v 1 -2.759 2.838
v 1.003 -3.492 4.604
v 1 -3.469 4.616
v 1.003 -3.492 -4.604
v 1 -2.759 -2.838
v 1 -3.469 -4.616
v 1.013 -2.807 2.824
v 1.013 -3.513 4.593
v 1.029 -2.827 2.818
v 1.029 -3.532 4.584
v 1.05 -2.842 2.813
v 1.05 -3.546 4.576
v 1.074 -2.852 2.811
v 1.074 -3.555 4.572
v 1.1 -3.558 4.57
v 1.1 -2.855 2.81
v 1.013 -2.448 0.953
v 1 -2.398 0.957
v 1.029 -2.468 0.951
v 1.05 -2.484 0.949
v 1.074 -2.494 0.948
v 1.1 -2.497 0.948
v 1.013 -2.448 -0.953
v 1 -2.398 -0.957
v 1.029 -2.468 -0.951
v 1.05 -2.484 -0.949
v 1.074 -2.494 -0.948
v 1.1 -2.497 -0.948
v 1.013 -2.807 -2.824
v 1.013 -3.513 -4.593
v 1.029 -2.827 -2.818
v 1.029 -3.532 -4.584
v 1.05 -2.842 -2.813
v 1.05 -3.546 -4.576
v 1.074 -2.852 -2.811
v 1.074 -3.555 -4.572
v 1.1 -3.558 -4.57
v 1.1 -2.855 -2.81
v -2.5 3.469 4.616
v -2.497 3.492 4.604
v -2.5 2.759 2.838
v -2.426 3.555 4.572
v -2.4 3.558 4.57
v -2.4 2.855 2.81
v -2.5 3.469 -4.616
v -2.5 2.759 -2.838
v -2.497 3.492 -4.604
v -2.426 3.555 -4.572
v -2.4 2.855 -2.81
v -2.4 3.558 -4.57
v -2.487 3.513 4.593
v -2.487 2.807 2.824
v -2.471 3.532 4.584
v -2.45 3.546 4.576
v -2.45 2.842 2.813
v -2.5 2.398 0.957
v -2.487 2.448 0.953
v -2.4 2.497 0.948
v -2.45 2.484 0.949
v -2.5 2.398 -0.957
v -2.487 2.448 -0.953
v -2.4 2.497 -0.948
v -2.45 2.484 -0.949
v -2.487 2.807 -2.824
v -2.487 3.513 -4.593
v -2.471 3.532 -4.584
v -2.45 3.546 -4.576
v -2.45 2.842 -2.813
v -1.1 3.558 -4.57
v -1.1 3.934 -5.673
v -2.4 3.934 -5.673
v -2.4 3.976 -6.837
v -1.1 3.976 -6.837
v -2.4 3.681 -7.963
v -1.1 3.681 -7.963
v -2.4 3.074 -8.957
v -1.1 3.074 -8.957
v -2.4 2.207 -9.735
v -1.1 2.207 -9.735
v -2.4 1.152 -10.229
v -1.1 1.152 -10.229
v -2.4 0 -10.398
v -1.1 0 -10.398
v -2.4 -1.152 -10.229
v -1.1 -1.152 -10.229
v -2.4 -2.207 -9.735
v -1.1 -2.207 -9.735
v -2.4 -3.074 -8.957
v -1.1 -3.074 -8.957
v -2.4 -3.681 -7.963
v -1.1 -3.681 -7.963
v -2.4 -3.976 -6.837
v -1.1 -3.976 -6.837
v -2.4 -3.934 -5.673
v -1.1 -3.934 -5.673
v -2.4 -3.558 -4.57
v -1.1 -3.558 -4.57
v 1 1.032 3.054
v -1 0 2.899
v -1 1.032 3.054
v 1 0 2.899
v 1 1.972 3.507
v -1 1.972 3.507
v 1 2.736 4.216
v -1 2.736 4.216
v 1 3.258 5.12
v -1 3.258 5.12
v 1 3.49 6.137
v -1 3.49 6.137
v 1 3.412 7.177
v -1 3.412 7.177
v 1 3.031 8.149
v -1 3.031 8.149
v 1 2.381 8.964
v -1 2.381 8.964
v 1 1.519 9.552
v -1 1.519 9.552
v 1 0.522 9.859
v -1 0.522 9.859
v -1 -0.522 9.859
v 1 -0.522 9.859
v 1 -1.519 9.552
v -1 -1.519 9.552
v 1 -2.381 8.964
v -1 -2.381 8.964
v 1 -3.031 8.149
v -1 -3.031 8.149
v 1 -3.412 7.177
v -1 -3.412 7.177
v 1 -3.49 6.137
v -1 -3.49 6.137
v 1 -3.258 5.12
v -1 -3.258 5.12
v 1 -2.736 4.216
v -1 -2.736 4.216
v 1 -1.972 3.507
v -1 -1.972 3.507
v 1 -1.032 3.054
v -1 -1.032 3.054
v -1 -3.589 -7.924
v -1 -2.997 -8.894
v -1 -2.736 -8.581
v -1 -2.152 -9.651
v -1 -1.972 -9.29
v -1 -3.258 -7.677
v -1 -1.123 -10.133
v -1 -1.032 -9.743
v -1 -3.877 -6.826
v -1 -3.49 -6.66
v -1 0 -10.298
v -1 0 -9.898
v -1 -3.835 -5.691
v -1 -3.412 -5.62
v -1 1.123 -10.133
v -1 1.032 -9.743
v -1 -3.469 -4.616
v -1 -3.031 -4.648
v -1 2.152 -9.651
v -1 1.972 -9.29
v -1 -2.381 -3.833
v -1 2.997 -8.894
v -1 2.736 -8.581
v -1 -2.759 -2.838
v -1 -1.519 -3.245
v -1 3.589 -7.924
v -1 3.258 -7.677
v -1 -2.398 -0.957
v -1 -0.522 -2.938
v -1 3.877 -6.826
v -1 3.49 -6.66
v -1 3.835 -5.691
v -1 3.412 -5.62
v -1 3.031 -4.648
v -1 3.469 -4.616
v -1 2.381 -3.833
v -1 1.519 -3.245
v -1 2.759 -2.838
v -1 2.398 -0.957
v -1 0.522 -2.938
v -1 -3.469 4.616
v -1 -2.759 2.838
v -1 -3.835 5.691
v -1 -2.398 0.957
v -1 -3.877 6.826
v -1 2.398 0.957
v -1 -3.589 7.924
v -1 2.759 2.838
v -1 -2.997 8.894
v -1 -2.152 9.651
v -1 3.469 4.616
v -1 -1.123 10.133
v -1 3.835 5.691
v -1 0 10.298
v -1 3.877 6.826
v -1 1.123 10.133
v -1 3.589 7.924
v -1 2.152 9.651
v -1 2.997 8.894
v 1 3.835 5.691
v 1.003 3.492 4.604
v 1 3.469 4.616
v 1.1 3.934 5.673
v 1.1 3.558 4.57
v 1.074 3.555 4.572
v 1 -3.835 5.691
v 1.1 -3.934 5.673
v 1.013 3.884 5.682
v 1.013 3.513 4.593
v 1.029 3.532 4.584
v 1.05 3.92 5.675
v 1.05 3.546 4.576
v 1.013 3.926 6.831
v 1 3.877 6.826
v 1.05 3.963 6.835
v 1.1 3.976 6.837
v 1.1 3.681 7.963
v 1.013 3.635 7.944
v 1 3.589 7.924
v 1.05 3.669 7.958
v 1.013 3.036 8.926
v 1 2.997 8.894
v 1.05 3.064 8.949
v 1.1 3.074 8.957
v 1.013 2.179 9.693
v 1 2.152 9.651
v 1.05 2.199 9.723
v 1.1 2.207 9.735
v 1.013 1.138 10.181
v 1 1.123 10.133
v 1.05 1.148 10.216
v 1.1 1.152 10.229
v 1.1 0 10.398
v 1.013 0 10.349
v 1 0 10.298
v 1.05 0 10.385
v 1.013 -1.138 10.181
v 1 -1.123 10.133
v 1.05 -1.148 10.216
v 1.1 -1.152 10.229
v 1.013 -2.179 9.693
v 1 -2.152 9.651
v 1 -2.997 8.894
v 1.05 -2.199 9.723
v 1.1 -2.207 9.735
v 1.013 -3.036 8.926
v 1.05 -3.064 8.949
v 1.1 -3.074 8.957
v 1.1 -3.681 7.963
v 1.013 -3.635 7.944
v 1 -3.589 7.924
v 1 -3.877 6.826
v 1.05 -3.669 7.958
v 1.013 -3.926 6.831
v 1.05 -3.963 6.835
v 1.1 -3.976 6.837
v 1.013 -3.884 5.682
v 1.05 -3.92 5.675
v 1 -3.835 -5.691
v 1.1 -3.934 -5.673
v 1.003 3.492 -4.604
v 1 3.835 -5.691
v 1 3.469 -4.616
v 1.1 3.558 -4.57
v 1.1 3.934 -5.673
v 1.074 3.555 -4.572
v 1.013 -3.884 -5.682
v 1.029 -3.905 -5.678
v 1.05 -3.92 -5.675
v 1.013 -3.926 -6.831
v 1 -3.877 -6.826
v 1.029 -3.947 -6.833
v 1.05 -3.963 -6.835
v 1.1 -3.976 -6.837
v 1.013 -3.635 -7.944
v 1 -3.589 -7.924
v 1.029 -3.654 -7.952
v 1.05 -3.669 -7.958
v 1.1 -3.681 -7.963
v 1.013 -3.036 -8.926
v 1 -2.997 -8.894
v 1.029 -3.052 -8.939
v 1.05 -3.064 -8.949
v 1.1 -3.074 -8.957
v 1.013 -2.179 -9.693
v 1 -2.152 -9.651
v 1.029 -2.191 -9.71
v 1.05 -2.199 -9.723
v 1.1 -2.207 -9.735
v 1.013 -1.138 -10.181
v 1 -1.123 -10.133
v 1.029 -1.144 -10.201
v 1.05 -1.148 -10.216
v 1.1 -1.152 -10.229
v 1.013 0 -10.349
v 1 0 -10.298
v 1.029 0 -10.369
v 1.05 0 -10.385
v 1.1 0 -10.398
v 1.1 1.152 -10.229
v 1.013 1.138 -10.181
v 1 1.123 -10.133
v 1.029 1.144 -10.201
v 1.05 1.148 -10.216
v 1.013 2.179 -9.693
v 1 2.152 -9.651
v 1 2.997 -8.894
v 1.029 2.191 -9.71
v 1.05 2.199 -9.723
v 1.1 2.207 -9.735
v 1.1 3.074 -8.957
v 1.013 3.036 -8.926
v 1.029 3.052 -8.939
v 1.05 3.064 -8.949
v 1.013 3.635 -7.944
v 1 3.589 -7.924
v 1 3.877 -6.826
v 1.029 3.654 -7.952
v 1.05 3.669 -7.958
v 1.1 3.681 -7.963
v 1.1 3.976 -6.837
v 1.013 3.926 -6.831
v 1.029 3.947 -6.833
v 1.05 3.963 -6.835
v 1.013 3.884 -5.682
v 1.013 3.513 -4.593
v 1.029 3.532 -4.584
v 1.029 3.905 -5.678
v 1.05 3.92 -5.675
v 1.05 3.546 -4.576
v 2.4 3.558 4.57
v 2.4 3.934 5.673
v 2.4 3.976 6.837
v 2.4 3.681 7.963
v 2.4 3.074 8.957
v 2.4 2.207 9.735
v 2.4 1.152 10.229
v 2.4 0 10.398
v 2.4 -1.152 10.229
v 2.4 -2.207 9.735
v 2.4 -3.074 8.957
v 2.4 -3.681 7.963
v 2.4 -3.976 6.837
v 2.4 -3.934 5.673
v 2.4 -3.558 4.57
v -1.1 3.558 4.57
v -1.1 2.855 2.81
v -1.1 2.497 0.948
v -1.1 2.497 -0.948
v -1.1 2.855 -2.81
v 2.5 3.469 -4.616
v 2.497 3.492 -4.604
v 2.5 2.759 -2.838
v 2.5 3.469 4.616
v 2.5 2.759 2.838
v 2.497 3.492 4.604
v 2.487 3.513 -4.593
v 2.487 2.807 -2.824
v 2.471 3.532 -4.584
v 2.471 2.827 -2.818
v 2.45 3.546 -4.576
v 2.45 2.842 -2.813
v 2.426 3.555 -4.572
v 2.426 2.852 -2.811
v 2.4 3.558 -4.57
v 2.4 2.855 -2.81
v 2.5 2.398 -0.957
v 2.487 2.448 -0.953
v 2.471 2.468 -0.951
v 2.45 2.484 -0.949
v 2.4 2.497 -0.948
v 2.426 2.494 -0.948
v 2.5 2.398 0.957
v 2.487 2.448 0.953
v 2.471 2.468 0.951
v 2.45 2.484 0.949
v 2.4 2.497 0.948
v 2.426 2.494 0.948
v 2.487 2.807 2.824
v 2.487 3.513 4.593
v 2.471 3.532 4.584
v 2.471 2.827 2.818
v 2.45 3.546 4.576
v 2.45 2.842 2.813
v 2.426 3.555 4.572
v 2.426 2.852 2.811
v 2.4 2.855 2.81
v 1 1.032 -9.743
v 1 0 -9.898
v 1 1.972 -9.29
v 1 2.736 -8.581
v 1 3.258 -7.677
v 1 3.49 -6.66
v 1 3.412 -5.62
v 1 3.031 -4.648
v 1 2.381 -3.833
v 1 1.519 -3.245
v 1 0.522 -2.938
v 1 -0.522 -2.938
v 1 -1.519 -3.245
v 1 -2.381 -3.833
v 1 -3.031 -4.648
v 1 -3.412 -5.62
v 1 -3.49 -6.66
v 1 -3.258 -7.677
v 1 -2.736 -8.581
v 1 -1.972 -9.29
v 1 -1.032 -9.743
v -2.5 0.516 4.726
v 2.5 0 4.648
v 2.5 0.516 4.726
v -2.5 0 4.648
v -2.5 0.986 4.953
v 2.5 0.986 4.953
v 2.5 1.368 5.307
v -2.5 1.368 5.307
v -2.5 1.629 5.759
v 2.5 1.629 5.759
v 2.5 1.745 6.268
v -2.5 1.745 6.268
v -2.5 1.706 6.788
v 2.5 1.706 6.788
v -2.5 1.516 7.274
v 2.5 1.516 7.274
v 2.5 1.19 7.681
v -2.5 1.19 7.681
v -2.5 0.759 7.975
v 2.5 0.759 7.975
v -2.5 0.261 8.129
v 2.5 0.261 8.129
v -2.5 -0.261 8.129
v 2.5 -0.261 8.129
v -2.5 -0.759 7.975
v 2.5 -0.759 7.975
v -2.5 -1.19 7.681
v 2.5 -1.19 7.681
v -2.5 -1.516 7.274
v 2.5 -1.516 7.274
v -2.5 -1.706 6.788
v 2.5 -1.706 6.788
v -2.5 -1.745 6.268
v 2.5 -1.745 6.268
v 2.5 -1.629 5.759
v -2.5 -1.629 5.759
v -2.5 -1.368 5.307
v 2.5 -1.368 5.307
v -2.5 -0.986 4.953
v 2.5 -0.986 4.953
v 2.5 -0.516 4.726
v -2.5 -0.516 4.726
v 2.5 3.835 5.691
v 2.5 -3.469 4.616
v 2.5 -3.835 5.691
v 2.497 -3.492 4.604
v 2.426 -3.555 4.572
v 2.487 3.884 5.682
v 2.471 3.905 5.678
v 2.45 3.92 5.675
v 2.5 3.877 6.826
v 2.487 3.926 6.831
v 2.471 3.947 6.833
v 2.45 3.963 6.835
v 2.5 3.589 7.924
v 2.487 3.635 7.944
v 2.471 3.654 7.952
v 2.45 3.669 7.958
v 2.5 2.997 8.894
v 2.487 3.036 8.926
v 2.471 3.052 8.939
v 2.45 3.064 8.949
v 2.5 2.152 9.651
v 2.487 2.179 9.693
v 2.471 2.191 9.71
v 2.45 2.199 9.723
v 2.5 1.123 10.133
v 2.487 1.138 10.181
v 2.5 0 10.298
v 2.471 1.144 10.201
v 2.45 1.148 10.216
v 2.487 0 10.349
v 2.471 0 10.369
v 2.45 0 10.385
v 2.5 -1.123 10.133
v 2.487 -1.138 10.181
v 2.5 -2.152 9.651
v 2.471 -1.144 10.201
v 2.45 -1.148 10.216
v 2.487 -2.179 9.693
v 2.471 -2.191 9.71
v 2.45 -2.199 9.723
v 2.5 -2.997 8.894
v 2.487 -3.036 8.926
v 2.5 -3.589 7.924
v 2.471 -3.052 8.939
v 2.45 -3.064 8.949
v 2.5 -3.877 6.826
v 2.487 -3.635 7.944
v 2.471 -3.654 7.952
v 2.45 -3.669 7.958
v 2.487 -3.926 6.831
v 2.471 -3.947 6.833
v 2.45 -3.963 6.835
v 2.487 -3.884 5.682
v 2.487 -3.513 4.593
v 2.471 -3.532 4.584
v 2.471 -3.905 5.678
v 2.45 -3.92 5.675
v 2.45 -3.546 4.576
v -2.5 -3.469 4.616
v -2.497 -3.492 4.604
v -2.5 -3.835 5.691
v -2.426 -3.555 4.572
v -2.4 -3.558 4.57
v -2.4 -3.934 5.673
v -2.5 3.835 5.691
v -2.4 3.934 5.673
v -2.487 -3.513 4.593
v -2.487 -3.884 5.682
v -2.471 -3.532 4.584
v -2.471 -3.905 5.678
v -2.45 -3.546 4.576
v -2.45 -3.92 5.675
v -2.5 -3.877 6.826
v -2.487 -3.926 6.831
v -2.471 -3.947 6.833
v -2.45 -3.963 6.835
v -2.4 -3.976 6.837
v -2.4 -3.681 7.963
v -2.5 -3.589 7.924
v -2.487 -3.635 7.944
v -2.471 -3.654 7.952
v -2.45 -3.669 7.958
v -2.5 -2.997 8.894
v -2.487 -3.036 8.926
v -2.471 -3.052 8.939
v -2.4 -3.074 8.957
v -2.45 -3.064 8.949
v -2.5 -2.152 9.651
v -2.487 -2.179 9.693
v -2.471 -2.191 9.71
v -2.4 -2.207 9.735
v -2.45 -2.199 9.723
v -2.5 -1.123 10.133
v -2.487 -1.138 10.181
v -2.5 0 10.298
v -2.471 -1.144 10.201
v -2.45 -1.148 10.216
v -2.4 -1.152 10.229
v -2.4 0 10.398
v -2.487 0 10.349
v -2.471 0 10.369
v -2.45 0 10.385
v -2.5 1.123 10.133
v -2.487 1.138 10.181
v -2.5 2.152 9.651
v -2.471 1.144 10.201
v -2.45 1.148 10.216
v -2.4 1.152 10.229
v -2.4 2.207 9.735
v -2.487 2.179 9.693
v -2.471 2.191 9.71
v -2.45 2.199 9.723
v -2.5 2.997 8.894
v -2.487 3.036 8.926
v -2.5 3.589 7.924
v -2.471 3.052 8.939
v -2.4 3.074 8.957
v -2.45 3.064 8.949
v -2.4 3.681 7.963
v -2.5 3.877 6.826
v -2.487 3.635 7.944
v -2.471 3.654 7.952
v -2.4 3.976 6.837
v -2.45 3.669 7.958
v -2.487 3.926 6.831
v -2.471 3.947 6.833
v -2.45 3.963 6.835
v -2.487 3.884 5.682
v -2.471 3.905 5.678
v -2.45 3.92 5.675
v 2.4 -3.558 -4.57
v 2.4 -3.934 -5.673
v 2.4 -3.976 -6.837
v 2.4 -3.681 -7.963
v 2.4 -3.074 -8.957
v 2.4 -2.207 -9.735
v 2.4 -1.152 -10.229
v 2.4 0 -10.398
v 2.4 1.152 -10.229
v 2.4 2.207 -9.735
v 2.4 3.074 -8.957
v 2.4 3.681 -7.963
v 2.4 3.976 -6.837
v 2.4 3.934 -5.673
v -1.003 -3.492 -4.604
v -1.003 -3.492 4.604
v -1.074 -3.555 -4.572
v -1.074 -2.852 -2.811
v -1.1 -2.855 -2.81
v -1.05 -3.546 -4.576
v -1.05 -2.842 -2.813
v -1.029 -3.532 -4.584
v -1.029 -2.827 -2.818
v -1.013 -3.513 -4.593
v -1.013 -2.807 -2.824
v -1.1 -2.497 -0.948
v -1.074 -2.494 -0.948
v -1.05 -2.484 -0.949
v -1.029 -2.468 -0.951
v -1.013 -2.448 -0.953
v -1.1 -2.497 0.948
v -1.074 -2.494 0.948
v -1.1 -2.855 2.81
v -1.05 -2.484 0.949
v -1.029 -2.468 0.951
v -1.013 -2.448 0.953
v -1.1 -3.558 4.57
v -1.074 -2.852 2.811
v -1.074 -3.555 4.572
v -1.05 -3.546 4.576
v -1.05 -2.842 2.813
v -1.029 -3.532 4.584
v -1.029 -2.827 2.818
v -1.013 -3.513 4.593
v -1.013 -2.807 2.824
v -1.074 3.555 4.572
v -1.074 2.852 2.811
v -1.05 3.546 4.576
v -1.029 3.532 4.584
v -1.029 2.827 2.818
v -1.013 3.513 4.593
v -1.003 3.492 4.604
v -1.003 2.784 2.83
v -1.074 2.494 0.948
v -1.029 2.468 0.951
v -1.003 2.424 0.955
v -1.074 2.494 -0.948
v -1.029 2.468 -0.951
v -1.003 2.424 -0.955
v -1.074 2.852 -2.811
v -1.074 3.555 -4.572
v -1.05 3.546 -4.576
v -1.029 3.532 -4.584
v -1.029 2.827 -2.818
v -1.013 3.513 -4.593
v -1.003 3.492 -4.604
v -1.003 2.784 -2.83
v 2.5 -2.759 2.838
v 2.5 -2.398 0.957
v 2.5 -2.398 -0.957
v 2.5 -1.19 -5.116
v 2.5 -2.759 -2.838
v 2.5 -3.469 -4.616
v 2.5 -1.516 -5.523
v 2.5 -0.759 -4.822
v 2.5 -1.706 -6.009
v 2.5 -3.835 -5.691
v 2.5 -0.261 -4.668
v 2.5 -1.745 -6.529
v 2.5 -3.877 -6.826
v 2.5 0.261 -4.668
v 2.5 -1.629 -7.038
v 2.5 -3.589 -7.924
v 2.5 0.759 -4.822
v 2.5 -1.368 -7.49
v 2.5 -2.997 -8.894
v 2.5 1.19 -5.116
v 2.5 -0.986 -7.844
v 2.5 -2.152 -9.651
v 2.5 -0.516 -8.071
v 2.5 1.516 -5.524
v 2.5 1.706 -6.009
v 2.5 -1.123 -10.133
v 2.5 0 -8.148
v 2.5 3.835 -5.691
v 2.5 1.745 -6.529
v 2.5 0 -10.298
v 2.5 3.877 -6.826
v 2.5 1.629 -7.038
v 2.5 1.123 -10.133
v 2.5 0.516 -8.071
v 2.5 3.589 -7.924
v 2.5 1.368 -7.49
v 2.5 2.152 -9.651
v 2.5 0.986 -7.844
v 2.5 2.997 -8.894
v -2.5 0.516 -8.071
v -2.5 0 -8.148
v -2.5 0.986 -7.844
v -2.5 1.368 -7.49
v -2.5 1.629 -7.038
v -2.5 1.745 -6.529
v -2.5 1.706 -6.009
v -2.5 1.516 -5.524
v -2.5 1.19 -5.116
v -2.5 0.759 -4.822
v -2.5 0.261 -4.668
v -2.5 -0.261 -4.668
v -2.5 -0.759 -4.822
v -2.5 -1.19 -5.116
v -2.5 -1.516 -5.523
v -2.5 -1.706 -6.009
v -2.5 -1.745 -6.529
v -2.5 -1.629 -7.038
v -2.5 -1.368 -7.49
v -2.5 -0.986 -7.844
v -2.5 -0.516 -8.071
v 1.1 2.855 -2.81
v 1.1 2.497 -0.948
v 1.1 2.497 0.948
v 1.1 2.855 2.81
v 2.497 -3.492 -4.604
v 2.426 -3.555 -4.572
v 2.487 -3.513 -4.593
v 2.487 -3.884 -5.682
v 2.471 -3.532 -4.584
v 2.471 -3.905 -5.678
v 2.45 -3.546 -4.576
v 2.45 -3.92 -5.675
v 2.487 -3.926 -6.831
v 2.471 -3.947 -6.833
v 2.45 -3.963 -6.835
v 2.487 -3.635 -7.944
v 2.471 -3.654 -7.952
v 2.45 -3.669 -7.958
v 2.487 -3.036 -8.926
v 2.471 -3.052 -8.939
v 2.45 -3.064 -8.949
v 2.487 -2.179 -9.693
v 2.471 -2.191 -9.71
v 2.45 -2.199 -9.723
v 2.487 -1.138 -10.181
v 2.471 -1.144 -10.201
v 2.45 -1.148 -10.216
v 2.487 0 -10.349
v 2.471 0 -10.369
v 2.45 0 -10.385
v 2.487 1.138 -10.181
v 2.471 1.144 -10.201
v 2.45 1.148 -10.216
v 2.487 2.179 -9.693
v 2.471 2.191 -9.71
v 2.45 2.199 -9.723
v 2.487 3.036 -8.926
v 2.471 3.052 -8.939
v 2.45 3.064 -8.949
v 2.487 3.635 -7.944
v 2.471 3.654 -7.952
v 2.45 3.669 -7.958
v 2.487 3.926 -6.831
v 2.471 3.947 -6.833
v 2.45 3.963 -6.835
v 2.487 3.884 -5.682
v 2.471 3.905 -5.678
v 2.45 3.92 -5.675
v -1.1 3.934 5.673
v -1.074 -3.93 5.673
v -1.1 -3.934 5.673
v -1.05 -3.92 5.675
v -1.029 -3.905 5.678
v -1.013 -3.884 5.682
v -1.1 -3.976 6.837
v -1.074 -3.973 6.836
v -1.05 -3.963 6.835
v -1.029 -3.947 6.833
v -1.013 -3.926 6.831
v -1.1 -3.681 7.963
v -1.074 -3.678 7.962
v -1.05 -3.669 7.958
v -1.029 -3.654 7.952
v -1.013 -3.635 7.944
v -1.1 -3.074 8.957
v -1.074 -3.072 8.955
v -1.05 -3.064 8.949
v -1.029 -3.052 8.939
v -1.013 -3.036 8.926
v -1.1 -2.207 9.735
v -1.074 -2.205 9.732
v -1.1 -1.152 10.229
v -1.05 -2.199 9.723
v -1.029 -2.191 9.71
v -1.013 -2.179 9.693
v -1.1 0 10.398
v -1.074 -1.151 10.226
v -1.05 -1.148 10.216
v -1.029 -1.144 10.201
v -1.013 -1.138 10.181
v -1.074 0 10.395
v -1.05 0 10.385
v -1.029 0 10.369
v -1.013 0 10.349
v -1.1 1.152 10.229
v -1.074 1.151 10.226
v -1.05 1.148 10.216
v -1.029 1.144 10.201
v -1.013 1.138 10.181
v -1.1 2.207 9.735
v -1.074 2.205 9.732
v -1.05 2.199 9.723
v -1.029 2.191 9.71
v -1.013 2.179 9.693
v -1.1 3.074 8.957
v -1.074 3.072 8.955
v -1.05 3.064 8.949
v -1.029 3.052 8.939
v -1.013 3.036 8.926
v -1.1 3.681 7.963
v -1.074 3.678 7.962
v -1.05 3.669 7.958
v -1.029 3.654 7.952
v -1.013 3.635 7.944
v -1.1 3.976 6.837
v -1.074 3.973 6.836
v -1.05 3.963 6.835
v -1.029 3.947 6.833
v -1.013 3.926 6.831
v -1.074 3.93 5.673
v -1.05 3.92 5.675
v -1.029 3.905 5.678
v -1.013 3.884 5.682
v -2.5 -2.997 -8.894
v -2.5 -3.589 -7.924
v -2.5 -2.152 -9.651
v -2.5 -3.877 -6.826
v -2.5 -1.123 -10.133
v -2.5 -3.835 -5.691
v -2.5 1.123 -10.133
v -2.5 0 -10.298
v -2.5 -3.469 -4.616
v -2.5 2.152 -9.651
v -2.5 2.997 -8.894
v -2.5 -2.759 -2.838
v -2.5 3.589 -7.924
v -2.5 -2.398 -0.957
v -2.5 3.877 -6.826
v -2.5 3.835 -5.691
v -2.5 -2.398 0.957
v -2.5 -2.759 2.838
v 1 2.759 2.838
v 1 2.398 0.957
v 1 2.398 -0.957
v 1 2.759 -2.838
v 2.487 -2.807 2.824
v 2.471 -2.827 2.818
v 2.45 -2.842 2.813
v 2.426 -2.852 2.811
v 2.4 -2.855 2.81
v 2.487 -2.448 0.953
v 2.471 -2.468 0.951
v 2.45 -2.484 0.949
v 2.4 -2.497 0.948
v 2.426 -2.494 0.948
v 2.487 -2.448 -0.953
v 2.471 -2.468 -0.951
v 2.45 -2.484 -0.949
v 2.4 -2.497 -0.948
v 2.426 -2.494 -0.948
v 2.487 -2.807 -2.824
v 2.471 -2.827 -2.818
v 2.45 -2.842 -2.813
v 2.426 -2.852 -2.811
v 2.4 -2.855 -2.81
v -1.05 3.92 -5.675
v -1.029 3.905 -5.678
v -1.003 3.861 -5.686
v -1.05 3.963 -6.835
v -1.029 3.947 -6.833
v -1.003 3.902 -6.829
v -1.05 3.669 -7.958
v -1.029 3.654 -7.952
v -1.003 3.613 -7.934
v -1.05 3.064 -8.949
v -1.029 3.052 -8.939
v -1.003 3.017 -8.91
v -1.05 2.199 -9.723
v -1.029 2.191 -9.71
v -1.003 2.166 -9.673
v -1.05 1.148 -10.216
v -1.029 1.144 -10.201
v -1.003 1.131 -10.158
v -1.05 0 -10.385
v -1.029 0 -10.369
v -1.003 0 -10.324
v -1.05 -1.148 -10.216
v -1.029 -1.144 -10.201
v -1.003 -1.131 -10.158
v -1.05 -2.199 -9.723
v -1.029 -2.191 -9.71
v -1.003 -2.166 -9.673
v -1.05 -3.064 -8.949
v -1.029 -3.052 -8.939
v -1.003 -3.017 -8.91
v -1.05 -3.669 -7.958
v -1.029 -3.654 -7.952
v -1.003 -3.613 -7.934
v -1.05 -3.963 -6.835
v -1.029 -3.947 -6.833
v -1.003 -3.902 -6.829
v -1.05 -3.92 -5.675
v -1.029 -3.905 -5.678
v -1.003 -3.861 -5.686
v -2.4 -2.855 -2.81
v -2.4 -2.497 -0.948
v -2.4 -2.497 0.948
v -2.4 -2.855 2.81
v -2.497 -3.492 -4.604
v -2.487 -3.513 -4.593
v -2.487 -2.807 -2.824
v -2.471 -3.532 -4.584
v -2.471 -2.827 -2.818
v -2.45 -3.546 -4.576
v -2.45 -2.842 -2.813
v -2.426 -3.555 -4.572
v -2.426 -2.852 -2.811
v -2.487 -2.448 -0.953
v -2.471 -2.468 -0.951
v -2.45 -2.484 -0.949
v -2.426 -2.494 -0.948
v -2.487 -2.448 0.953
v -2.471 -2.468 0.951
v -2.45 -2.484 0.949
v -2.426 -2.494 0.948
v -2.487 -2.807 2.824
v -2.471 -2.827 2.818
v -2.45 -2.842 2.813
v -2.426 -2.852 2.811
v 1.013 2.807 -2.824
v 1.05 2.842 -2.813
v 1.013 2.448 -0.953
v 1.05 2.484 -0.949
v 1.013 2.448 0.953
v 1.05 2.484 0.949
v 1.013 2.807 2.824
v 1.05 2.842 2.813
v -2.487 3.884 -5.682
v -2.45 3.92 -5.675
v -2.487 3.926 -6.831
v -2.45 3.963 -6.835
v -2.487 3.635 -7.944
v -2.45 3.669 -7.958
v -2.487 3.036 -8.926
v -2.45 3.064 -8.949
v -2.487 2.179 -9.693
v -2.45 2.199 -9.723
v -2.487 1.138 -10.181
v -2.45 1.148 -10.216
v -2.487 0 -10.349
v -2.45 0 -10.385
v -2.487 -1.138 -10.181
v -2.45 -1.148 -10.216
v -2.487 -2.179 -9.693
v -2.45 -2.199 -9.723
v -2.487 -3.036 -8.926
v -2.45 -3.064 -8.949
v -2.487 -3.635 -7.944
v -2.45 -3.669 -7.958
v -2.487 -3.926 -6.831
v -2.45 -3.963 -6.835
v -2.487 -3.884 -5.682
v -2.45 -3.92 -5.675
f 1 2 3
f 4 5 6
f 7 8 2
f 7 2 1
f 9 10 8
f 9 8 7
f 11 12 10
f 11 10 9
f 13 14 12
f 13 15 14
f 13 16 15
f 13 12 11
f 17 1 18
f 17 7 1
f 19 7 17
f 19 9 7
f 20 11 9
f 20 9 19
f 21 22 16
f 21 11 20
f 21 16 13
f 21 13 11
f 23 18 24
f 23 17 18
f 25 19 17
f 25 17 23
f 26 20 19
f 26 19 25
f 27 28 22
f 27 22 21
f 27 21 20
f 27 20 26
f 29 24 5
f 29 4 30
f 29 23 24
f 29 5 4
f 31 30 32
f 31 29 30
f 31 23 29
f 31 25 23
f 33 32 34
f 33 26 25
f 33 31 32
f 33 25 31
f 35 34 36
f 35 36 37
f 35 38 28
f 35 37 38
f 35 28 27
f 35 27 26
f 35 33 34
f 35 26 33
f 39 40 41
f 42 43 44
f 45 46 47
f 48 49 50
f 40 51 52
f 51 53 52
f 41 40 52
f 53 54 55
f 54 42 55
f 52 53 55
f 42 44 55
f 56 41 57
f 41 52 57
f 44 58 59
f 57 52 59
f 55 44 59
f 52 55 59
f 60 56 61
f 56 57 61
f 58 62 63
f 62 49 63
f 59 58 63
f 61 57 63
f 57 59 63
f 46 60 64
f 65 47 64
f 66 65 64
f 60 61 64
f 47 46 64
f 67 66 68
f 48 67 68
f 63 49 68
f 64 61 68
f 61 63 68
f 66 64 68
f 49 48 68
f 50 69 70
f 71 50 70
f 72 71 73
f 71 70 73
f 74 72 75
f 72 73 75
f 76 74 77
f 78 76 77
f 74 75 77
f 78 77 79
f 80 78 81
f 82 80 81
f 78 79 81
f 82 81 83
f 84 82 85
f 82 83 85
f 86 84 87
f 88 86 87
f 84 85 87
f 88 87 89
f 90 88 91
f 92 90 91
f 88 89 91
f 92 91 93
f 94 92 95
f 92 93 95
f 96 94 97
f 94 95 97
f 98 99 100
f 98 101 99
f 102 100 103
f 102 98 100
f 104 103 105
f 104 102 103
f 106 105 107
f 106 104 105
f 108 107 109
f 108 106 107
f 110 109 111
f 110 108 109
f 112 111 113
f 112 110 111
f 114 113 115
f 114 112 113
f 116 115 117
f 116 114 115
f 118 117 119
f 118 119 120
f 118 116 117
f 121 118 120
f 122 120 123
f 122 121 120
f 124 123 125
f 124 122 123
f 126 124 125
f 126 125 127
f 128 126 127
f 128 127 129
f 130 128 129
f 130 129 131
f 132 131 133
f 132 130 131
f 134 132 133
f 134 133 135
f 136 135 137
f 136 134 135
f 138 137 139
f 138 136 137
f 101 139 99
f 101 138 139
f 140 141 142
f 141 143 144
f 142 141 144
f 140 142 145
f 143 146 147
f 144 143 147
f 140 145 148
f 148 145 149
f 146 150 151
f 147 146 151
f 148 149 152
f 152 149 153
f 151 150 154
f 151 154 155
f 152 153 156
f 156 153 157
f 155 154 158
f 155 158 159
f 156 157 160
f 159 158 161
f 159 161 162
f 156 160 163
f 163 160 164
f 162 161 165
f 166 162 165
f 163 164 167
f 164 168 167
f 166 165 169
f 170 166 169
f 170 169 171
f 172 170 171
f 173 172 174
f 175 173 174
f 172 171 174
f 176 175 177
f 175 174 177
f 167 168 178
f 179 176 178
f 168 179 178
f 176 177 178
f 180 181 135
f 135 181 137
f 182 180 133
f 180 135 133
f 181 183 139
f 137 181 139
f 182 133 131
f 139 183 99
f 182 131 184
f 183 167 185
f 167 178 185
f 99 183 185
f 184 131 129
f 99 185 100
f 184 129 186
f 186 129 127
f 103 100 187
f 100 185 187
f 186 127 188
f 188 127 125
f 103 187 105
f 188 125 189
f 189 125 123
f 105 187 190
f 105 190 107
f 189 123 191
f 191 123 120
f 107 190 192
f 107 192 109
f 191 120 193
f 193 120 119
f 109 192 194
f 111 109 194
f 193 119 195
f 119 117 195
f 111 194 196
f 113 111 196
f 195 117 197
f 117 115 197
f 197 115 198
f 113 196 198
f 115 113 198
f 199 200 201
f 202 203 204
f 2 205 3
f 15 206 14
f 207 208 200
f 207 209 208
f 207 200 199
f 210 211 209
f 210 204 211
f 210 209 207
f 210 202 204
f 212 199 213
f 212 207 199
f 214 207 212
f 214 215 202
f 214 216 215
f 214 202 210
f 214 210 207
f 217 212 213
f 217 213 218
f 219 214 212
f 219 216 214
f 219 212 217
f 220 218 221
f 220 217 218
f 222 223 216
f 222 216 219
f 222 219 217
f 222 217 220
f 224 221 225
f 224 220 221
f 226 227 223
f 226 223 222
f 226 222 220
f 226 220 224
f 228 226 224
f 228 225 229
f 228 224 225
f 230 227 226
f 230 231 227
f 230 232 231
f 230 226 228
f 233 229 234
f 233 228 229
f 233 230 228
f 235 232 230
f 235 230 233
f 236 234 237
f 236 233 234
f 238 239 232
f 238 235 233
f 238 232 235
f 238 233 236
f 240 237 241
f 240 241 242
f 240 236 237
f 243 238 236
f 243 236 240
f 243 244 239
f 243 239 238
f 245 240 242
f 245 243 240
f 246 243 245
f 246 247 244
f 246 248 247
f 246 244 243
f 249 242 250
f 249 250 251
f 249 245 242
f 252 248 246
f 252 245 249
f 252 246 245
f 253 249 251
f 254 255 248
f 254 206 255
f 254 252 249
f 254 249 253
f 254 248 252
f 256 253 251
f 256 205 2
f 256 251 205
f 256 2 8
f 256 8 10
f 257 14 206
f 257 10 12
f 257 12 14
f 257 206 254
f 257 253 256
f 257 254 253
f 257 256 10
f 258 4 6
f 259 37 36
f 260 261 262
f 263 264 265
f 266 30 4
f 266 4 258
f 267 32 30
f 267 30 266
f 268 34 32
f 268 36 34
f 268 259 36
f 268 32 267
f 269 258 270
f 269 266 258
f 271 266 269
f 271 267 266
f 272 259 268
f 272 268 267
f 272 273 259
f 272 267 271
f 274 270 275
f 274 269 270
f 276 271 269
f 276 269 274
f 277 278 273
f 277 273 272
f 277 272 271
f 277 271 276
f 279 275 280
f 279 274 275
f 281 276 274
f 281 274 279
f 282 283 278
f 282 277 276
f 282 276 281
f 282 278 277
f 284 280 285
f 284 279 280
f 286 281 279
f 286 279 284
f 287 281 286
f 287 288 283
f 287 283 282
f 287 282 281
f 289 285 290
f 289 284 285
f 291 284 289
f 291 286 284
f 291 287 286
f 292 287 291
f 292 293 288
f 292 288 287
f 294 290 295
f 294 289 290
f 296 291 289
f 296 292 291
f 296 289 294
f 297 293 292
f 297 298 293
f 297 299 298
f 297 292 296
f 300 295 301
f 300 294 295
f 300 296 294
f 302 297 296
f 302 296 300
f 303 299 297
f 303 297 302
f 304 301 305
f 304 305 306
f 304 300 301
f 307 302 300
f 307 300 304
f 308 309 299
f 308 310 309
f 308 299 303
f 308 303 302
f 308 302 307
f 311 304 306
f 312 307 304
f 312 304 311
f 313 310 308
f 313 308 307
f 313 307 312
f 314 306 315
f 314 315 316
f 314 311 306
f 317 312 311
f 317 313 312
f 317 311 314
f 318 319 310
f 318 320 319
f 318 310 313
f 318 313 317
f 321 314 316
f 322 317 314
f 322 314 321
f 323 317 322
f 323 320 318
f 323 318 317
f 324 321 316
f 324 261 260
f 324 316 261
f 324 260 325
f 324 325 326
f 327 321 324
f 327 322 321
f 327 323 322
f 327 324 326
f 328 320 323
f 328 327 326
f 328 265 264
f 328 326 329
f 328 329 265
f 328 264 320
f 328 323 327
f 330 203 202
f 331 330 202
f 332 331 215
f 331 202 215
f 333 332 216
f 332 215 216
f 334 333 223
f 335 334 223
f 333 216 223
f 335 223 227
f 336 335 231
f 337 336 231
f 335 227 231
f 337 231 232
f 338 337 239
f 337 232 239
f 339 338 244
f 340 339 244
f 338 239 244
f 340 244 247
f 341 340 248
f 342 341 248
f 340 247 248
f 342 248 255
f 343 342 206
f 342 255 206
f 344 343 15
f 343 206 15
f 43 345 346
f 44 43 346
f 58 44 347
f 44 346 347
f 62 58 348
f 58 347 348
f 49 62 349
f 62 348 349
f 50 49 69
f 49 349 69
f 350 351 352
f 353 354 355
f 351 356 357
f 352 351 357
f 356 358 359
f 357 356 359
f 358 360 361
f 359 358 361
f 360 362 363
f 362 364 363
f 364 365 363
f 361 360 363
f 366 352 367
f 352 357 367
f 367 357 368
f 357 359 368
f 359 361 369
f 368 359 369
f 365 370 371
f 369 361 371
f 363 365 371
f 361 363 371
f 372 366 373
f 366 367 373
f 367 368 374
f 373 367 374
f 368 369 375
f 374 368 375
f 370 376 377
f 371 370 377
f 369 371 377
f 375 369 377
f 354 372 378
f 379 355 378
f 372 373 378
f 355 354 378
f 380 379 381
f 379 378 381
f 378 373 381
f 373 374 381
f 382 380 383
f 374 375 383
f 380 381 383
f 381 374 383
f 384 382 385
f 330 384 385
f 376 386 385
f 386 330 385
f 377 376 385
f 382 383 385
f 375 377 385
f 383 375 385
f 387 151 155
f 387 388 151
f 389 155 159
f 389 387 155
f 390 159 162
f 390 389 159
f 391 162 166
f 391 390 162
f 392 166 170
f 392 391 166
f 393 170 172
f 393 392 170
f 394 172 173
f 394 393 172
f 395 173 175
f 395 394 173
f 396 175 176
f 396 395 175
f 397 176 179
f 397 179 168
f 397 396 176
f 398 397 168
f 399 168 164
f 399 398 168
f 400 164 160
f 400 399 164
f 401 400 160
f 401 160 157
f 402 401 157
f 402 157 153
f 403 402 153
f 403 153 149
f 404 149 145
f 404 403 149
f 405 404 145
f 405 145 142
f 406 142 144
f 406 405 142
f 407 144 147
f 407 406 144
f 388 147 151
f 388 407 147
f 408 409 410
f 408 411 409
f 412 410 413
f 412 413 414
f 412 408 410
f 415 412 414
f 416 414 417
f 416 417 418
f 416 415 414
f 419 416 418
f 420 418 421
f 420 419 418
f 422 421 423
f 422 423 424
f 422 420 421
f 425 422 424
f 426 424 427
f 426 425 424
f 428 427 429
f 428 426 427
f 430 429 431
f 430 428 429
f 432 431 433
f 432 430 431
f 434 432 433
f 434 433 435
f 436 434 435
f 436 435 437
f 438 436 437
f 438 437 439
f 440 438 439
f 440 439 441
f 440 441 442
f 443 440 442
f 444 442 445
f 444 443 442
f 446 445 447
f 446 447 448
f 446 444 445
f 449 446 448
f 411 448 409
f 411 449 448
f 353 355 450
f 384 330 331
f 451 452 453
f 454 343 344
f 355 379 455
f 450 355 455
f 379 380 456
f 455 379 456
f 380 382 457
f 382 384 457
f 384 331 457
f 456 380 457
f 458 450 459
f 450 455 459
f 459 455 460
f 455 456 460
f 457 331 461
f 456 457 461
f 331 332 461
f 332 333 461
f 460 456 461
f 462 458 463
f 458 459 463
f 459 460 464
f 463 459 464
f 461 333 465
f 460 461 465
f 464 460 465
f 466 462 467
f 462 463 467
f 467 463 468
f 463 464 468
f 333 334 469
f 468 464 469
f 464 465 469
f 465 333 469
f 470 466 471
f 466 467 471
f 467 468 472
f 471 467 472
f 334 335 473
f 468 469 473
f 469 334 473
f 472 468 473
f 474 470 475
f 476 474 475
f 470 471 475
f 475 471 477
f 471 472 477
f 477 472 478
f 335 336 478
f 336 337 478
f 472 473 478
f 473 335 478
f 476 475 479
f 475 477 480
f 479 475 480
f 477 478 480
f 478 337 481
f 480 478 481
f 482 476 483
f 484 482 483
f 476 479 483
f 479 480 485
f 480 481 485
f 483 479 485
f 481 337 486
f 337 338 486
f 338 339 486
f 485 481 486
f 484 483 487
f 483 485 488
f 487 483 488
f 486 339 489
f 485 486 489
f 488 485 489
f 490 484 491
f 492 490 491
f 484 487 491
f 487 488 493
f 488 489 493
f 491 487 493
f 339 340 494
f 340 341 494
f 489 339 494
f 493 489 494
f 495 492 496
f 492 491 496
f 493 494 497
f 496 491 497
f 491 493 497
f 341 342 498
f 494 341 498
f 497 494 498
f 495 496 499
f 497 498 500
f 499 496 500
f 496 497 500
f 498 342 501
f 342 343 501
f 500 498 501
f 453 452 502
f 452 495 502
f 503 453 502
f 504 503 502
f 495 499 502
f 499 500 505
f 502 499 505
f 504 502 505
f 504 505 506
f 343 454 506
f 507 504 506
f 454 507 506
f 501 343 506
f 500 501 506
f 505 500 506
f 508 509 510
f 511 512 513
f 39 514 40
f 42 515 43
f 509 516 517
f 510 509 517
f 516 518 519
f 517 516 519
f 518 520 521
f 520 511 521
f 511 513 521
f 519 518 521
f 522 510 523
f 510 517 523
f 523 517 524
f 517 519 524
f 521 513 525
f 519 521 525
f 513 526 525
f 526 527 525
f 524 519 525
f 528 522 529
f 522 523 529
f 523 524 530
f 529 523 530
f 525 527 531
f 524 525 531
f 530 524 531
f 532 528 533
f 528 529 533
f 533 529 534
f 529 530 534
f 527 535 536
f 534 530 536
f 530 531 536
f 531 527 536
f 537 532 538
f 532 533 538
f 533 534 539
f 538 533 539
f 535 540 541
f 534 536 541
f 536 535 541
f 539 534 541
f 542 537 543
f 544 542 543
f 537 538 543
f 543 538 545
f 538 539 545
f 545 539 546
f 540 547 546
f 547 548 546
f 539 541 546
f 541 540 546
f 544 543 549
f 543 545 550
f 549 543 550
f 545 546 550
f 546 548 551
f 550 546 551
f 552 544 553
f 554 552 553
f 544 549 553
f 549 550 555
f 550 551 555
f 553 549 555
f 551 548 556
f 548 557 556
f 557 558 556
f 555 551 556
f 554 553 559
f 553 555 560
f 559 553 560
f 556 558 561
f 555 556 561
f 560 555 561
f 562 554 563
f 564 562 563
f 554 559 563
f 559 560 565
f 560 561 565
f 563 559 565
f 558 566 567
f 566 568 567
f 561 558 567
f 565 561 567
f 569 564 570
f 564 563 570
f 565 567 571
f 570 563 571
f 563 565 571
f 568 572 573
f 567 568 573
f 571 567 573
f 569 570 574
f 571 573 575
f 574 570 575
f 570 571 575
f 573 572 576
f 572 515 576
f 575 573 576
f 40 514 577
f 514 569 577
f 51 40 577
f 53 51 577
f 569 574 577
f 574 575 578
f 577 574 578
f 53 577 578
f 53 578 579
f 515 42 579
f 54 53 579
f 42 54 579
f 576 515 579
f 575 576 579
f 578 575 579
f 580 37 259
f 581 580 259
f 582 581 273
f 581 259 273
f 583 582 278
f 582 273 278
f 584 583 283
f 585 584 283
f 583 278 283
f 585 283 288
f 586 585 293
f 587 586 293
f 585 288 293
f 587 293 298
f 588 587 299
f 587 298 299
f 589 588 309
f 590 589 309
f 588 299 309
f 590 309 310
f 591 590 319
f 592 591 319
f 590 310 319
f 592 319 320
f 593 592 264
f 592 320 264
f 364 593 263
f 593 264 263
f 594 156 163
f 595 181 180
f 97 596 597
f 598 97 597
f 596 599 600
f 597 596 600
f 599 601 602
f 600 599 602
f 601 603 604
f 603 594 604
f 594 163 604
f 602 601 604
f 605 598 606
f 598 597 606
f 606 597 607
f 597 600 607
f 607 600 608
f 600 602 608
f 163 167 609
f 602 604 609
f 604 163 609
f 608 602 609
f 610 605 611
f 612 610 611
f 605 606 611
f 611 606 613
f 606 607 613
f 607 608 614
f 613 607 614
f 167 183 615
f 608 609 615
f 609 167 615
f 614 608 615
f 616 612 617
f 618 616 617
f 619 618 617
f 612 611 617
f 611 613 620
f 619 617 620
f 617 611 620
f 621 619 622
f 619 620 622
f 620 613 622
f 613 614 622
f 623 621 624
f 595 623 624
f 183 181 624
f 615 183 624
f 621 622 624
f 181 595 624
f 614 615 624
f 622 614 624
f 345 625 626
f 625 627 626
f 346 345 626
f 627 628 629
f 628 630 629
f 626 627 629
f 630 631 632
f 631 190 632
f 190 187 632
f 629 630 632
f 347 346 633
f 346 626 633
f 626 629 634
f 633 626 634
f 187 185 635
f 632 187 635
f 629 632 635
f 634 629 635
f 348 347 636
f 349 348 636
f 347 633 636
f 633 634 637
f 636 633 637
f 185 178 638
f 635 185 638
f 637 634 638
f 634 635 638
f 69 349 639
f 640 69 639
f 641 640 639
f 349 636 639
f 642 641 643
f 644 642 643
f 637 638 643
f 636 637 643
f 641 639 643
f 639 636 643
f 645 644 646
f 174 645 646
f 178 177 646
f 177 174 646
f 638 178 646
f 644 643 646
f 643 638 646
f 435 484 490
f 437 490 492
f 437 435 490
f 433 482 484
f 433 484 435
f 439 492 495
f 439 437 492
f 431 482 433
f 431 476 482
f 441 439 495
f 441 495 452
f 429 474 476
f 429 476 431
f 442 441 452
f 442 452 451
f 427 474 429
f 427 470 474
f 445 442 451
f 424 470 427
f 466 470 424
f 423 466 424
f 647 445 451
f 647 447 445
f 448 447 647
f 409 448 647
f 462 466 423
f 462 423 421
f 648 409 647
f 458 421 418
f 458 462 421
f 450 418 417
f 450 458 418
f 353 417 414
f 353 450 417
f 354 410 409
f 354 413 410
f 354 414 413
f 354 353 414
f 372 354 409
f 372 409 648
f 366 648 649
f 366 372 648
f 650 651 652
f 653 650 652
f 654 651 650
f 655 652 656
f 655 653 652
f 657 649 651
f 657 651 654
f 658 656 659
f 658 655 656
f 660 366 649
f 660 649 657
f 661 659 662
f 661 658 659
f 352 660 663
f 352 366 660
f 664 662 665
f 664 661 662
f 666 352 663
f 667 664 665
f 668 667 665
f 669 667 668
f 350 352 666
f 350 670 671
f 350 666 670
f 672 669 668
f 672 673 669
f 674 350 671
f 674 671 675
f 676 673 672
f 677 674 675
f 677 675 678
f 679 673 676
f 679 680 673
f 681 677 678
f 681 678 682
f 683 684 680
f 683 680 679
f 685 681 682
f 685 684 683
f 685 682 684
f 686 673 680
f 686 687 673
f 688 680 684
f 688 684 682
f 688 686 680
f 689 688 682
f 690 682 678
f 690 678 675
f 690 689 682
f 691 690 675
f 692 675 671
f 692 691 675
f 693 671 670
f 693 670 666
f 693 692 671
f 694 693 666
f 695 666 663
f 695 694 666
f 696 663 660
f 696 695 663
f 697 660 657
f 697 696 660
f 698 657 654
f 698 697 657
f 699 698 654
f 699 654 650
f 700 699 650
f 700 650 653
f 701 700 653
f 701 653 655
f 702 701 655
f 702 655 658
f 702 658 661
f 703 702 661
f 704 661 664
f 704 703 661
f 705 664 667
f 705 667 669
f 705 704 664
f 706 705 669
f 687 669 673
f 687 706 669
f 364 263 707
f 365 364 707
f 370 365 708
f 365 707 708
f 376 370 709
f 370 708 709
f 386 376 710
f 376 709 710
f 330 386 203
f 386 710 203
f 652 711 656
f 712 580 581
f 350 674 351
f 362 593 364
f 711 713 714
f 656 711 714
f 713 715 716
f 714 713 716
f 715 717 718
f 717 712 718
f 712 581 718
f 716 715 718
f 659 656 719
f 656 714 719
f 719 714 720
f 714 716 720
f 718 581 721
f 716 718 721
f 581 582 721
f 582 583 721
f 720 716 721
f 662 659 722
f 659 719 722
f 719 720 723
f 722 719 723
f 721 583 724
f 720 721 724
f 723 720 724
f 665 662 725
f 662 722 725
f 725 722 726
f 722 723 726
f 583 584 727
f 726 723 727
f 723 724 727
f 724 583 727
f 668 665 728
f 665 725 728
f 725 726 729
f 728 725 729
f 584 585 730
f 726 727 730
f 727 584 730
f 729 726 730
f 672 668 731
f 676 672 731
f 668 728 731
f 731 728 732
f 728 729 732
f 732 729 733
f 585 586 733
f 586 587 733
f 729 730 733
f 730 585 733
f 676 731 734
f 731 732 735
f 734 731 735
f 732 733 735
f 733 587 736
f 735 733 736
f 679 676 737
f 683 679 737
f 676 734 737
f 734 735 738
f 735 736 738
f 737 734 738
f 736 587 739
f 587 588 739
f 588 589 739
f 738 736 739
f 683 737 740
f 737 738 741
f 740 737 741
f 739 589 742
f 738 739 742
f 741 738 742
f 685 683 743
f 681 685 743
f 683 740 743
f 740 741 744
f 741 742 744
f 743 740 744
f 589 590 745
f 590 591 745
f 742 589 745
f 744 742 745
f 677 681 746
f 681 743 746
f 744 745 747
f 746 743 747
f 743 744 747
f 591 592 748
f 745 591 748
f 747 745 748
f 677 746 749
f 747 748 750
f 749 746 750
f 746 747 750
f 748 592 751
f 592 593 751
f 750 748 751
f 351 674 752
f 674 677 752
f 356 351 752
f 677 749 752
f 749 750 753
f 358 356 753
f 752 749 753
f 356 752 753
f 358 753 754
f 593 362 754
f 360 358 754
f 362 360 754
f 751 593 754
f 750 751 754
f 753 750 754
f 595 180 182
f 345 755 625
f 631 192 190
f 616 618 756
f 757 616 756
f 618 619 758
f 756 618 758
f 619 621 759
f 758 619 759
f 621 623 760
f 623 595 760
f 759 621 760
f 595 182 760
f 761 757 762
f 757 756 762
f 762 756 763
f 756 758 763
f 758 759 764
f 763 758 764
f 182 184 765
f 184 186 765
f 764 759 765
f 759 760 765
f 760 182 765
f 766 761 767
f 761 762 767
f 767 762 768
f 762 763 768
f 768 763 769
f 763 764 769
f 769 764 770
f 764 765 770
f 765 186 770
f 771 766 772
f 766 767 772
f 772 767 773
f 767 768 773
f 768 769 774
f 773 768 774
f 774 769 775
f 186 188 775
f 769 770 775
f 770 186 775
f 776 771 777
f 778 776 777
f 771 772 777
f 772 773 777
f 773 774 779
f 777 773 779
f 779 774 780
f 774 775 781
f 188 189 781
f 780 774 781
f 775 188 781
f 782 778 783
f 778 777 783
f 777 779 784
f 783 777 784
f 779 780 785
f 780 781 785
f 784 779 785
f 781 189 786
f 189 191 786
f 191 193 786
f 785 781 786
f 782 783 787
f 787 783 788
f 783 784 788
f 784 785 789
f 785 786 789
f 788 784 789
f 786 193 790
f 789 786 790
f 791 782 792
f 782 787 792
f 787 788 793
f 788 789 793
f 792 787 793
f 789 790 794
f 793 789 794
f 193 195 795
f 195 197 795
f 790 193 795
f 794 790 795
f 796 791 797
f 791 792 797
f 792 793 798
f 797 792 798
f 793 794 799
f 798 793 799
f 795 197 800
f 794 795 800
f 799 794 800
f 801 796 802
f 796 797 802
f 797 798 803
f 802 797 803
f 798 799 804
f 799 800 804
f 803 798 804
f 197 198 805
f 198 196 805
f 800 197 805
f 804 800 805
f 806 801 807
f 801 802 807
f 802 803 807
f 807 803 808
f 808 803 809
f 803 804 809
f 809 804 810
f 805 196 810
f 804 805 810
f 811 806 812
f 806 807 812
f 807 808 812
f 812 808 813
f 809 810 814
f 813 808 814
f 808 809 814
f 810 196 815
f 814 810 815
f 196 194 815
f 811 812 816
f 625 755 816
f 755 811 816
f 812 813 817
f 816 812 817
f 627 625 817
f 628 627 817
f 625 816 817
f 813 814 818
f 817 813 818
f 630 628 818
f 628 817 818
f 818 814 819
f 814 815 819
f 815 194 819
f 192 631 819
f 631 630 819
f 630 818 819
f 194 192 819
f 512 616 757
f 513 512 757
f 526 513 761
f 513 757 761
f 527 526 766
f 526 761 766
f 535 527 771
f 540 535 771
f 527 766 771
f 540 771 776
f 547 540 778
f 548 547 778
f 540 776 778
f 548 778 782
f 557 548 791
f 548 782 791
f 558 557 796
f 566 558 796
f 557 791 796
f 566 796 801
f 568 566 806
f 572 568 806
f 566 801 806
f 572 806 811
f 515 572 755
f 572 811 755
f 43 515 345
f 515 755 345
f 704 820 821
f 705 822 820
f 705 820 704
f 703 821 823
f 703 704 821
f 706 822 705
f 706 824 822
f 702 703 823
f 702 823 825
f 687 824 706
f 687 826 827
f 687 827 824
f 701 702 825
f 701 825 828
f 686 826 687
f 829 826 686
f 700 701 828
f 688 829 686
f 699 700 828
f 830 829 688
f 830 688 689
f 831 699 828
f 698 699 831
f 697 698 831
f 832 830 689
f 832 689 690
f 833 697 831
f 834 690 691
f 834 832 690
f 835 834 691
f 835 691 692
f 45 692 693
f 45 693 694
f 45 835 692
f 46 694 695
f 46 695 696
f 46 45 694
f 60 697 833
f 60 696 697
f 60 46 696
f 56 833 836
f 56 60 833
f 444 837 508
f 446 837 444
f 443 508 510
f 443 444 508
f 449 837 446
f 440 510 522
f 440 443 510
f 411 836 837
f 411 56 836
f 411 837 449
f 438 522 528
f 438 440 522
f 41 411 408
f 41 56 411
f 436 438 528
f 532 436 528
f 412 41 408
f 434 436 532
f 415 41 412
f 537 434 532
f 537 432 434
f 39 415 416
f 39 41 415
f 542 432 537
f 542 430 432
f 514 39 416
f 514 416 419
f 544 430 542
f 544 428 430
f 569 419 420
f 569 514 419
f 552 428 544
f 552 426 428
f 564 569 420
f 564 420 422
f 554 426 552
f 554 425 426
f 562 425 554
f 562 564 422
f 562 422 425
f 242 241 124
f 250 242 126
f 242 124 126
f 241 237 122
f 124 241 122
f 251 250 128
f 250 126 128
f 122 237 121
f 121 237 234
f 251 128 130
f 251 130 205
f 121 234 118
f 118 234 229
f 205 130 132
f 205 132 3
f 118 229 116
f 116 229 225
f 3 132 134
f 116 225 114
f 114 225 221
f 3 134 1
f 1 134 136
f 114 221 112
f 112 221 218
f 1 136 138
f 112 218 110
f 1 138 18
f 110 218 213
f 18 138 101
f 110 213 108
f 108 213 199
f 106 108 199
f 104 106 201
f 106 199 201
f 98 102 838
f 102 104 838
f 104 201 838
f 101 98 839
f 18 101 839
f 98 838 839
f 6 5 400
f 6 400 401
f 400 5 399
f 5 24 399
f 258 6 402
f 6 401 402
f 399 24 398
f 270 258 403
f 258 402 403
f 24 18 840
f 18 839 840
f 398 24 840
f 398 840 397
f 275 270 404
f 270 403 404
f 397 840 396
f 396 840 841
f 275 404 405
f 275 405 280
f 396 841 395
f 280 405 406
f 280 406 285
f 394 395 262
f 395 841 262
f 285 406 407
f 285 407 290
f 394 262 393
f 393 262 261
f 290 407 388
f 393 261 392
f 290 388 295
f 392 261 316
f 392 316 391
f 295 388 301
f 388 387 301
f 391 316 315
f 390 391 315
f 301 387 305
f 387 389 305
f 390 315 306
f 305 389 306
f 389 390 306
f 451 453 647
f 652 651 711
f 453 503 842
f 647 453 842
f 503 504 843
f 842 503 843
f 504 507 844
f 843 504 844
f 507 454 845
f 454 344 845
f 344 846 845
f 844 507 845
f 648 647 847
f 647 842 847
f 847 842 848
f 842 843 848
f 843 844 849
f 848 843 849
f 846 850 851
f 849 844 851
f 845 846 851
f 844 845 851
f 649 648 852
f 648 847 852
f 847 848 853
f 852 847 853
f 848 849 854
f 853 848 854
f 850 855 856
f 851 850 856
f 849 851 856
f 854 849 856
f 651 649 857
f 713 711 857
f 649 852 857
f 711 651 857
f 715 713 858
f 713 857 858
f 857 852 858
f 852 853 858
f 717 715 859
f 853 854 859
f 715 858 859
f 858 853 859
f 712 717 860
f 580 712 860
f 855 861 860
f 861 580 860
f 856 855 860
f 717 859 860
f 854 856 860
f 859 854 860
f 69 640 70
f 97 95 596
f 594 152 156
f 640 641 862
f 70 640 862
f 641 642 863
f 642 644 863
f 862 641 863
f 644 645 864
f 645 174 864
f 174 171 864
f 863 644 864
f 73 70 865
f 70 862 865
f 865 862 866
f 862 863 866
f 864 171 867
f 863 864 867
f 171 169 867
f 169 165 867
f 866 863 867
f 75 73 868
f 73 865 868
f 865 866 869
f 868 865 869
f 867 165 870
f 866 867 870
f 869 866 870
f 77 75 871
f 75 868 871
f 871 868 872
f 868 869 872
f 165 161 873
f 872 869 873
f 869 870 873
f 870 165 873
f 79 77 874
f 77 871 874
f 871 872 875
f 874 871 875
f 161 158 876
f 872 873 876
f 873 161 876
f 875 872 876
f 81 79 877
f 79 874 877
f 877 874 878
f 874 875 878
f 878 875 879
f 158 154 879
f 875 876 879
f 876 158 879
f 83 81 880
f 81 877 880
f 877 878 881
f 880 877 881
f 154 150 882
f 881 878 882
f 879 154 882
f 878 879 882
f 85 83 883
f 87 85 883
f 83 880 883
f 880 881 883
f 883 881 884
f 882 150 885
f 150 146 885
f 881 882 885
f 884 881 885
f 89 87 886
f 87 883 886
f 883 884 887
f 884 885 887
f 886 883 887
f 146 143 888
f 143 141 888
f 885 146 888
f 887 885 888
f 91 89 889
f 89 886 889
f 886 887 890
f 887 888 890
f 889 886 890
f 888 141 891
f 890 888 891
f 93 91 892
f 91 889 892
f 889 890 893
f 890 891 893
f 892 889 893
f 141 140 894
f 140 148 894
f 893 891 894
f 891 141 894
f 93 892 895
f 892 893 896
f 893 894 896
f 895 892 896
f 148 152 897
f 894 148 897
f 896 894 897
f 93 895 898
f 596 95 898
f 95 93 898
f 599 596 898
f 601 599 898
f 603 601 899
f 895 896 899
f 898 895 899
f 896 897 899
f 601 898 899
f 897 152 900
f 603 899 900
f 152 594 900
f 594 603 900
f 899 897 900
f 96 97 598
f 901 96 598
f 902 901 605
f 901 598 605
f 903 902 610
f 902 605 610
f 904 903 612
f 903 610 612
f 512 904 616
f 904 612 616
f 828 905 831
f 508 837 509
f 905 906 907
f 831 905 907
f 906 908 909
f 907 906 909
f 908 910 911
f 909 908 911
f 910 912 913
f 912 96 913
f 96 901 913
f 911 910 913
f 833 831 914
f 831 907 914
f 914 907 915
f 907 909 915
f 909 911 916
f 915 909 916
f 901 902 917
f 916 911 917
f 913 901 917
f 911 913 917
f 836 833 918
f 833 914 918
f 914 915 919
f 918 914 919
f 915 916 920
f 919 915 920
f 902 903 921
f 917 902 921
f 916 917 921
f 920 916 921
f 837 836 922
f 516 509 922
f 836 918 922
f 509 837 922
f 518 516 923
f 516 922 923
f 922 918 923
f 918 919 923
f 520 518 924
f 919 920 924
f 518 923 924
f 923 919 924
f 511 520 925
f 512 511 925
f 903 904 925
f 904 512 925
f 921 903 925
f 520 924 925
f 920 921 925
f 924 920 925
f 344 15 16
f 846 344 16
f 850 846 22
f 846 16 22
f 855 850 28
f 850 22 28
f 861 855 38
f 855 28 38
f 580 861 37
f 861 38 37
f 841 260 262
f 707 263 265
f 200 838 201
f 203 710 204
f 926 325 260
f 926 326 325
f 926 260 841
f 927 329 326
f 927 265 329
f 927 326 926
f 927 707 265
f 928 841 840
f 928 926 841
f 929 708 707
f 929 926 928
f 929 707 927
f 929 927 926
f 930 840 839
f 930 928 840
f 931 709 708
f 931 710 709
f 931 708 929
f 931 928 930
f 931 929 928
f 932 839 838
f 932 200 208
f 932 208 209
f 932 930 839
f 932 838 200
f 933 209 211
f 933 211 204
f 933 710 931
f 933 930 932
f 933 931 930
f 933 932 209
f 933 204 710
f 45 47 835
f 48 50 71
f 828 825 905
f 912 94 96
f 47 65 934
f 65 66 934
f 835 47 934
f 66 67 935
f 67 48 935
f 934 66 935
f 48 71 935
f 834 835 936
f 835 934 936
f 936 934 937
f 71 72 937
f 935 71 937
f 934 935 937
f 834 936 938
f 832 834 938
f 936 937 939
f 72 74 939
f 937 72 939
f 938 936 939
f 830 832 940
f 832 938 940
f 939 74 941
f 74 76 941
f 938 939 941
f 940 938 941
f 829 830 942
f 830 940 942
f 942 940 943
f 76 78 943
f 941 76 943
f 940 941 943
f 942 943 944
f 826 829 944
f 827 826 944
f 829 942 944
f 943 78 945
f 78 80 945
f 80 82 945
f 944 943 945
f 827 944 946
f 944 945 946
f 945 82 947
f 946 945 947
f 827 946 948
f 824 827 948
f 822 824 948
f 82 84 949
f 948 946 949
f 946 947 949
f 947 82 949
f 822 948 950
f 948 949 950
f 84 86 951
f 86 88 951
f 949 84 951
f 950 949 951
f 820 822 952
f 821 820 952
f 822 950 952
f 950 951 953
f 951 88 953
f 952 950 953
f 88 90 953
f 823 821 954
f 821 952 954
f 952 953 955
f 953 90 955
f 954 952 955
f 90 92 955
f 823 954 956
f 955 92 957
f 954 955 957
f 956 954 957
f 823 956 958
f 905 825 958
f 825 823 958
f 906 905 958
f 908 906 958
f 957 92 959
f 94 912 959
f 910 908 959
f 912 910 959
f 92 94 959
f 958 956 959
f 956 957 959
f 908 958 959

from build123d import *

# Parameters (mm, degrees)
BOSS_EXTRUDE1_START = 1
SKETCH1_R           = 1.75
BOSS_EXTRUDE1_DEPTH = 1.5
BOSS_EXTRUDE2_START = -1
SKETCH2_R           = 1.75
BOSS_EXTRUDE2_DEPTH = 1.5
SKETCH3_R           = 3.5
SKETCH3_R_2         = 1.75
BOSS_EXTRUDE3_DEPTH = 1
FILLET1_R           = 0.1


with BuildPart() as part:
    # Sketch1 → Boss-Extrude1 (new body)
    with BuildSketch(Plane(origin=(0, 0, 0), x_dir=(0, 0, -1), z_dir=(1, 0, 0)).offset(BOSS_EXTRUDE1_START)):
        with BuildLine():
            ThreePointArc((-4.570357143, 3.557793374), (-10.3985, 0), (-4.570357143, -3.557793374))
            ThreePointArc((-4.570357143, -3.557793374), (0, -2.45227681), (4.570357143, -3.557793374))
            ThreePointArc((4.570357143, -3.557793374), (10.3985, 0), (4.570357143, 3.557793374))
            ThreePointArc((4.570357143, 3.557793374), (0, 2.45227681), (-4.570357143, 3.557793374))
        make_face()
        with Locations((-6.3985, 0)):
            Circle(SKETCH1_R, mode=Mode.SUBTRACT)
        with Locations((6.3985, 0)):
            Circle(SKETCH1_R, mode=Mode.SUBTRACT)
    extrude(amount=BOSS_EXTRUDE1_DEPTH)



with BuildPart() as body_2:
    # Sketch2 → Boss-Extrude2 (new body)
    with BuildSketch(Plane(origin=(0, 0, 0), x_dir=(0, 0, -1), z_dir=(1, 0, 0)).offset(BOSS_EXTRUDE2_START)):
        with BuildLine():
            ThreePointArc((4.570357143, -3.557793374), (0, -2.45227681), (-4.570357143, -3.557793374))
            ThreePointArc((-4.570357143, -3.557793374), (-10.3985, 0), (-4.570357143, 3.557793374))
            ThreePointArc((-4.570357143, 3.557793374), (0, 2.45227681), (4.570357143, 3.557793374))
            ThreePointArc((4.570357143, 3.557793374), (10.3985, 0), (4.570357143, -3.557793374))
        make_face()
        with Locations((-6.3985, 0)):
            Circle(SKETCH2_R, mode=Mode.SUBTRACT)
        with Locations((6.3985, 0)):
            Circle(SKETCH2_R, mode=Mode.SUBTRACT)
    extrude(amount=-BOSS_EXTRUDE2_DEPTH)


with BuildPart() as part_1:
    add(part.part)

    add(body_2.part)  # Boss-Extrude3 merges body 2
    # Sketch3 → Boss-Extrude3 (add, symmetric)
    with BuildSketch(Plane(origin=(0, 0, 0), x_dir=(0, 0, -1), z_dir=(1, 0, 0))):
        with Locations((6.3985, 0)):
            Circle(SKETCH3_R)
        with Locations((6.3985, 0)):
            Circle(SKETCH3_R_2, mode=Mode.SUBTRACT)
        with Locations((-6.3985, 0)):
            Circle(SKETCH3_R)
        with Locations((-6.3985, 0)):
            Circle(SKETCH3_R_2, mode=Mode.SUBTRACT)
    extrude(amount=BOSS_EXTRUDE3_DEPTH, both=True)

    # Fillet1
    fillet1_edges = [part_1.edges().sort_by_distance(p)[0] for p in [
        (2.5, 2.45227681, 0),
        (2.5, 0, 10.3985),
        (-2.5, 0, -10.3985),
        (-2.5, -2.45227681, 0),
        (-2.5, 0, 10.3985),
        (-2.5, 2.45227681, 0),
        (-1, 0, -10.3985),
        (-1, 2.45227681, 0),
        (-1, 0, 10.3985),
        (-1, -2.45227681, 0),
        (2.5, -2.45227681, 0),
        (1, 0, 10.3985),
        (1, 2.45227681, 0),
        (1, 0, -10.3985),
        (1, -2.45227681, 0),
        (2.5, 0, -10.3985),
    ]]
    fillet(fillet1_edges, radius=FILLET1_R)


solid = part_1.part
